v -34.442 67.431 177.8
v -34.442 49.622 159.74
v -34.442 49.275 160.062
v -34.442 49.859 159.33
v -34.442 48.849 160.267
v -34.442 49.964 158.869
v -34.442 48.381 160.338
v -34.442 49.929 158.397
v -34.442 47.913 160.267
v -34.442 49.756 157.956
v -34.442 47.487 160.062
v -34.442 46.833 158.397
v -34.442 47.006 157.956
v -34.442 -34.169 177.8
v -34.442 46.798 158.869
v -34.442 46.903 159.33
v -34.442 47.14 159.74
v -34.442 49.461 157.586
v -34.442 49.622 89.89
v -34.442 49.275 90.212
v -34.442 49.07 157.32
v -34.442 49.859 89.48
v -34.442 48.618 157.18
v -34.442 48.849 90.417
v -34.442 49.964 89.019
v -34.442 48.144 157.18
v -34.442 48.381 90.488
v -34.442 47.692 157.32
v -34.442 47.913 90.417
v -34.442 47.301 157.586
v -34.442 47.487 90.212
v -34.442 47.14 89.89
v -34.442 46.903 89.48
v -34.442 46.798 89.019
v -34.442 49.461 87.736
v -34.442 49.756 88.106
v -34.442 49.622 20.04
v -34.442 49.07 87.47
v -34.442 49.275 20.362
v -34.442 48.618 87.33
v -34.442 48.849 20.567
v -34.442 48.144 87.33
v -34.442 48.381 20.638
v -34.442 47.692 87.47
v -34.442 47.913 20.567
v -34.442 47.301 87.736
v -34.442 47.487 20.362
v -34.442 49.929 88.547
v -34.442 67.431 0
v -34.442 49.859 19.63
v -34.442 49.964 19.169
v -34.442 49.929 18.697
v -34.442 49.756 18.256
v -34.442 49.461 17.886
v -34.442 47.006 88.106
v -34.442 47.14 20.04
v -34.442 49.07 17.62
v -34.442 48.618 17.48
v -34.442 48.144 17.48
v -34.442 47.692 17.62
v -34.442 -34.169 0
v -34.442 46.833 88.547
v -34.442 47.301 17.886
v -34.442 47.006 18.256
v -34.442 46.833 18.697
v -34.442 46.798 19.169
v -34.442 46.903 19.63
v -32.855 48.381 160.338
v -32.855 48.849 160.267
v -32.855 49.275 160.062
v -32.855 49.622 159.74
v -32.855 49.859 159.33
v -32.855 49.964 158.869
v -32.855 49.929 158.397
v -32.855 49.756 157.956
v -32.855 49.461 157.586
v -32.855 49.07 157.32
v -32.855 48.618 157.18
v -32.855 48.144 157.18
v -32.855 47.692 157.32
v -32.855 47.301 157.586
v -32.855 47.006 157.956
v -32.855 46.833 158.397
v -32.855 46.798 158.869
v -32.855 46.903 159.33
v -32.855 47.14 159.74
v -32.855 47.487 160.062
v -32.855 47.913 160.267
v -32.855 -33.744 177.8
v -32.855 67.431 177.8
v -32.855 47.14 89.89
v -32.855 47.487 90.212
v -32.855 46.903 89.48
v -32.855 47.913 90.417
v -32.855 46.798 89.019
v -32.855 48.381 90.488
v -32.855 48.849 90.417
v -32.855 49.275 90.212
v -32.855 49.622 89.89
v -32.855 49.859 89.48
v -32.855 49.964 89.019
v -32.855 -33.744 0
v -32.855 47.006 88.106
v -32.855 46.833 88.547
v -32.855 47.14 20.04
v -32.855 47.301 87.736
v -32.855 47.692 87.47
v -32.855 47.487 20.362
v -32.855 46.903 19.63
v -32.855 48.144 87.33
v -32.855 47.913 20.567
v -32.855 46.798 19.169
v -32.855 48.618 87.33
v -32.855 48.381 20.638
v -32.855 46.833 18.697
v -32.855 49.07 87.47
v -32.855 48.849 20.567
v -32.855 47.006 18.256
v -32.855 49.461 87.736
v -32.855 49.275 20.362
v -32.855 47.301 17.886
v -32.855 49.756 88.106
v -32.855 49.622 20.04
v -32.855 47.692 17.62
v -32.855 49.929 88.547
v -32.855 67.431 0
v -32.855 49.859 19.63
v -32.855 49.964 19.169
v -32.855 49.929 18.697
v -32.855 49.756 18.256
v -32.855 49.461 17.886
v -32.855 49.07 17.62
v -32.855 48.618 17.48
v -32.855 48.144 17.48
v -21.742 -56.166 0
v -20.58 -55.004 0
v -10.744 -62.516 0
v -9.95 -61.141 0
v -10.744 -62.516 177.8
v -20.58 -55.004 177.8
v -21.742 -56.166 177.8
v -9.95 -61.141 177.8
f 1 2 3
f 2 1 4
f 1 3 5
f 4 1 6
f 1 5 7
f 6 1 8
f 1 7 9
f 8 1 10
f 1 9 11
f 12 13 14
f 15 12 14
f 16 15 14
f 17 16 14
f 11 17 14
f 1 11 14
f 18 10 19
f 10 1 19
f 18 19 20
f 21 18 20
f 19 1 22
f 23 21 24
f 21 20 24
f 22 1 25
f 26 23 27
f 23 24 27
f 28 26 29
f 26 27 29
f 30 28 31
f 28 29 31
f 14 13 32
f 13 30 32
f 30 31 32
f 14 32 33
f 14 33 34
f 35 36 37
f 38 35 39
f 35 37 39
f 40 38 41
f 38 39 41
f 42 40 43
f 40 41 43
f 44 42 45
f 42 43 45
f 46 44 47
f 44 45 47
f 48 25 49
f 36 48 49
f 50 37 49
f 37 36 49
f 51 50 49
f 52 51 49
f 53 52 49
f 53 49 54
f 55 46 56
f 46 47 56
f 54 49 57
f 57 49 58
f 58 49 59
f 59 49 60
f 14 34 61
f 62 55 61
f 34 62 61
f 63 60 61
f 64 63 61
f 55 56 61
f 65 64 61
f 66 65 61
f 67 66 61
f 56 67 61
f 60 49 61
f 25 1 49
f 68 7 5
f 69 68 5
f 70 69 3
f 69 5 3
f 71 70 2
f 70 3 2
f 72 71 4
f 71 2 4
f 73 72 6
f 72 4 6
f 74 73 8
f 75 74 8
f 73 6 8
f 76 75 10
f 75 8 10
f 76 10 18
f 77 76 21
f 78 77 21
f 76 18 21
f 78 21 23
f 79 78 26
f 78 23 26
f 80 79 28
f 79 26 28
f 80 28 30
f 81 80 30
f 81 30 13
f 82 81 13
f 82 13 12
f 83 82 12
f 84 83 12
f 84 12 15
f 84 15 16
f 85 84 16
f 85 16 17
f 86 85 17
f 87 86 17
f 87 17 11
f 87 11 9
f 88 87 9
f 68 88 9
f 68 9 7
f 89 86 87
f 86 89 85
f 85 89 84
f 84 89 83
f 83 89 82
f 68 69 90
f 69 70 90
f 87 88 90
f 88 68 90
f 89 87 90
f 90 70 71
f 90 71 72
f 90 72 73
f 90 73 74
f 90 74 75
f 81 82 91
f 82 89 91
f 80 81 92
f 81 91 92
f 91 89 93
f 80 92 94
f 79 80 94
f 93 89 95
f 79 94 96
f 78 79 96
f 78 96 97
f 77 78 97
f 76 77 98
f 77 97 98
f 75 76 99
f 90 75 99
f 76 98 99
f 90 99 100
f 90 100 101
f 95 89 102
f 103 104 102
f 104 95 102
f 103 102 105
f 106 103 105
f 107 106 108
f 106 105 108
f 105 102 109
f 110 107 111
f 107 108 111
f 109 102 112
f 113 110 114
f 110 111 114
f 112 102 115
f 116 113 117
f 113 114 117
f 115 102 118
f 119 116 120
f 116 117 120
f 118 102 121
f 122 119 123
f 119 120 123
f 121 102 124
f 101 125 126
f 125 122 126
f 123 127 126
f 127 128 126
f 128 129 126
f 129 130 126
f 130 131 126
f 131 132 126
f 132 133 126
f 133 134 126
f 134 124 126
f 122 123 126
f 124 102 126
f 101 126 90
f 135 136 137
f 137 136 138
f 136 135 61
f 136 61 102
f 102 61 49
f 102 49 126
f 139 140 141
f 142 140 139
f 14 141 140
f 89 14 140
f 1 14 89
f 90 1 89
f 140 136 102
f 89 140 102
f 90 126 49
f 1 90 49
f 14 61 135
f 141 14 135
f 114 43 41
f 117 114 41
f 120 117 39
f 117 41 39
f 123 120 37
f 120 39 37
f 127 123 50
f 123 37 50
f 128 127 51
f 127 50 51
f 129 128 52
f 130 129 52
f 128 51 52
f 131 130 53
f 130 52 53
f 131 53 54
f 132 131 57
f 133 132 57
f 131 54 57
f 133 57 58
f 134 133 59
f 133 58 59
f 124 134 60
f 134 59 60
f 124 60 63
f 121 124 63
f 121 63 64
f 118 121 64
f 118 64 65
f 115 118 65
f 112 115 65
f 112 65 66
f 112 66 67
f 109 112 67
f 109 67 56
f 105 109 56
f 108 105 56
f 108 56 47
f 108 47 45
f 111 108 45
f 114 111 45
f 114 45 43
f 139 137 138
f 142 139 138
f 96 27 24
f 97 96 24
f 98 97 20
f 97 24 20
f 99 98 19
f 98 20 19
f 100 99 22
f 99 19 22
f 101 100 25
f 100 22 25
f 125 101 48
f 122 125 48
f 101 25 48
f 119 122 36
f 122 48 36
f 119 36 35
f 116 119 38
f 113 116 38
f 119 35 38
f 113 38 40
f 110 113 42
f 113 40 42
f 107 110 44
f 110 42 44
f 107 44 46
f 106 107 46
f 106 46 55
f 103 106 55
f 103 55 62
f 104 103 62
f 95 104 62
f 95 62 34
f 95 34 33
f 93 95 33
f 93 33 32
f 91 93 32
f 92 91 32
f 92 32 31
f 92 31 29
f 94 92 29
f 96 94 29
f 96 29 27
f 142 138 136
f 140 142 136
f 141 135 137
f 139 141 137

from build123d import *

# Parameters (mm, degrees)
EXTRUDE_1_DEPTH     = 177.8
SKETCH_2_R          = 1.5875
CUT_EXTRUDE_1_DEPTH = 254


with BuildPart() as part:
    # 스케치1 → 보스-돌출1 (new body)
    with BuildSketch(Plane.XY):
        Polygon((-34.442078201, -34.169098619), (-21.742078201, -56.166143875), (-10.743555573, -62.516143875), (-9.949805573, -61.141328546), (-20.579947544, -55.004013218), (-32.854578201, -33.743729276), (-32.854578201, 67.430901381), (-34.442078201, 67.430901381), align=None)
    extrude(amount=EXTRUDE_1_DEPTH)

    # 스케치2 → 컷-돌출1 (cut)
    with BuildSketch(Plane.ZY.offset(34.442078201)):
        with Locations((158.75, 48.380901381)):
            Circle(SKETCH_2_R)
        with Locations((88.9, 48.380901381)):
            Circle(SKETCH_2_R)
        with Locations((19.05, 48.380901381)):
            Circle(SKETCH_2_R)
    extrude(amount=-CUT_EXTRUDE_1_DEPTH, mode=Mode.SUBTRACT)


solid = part.part
